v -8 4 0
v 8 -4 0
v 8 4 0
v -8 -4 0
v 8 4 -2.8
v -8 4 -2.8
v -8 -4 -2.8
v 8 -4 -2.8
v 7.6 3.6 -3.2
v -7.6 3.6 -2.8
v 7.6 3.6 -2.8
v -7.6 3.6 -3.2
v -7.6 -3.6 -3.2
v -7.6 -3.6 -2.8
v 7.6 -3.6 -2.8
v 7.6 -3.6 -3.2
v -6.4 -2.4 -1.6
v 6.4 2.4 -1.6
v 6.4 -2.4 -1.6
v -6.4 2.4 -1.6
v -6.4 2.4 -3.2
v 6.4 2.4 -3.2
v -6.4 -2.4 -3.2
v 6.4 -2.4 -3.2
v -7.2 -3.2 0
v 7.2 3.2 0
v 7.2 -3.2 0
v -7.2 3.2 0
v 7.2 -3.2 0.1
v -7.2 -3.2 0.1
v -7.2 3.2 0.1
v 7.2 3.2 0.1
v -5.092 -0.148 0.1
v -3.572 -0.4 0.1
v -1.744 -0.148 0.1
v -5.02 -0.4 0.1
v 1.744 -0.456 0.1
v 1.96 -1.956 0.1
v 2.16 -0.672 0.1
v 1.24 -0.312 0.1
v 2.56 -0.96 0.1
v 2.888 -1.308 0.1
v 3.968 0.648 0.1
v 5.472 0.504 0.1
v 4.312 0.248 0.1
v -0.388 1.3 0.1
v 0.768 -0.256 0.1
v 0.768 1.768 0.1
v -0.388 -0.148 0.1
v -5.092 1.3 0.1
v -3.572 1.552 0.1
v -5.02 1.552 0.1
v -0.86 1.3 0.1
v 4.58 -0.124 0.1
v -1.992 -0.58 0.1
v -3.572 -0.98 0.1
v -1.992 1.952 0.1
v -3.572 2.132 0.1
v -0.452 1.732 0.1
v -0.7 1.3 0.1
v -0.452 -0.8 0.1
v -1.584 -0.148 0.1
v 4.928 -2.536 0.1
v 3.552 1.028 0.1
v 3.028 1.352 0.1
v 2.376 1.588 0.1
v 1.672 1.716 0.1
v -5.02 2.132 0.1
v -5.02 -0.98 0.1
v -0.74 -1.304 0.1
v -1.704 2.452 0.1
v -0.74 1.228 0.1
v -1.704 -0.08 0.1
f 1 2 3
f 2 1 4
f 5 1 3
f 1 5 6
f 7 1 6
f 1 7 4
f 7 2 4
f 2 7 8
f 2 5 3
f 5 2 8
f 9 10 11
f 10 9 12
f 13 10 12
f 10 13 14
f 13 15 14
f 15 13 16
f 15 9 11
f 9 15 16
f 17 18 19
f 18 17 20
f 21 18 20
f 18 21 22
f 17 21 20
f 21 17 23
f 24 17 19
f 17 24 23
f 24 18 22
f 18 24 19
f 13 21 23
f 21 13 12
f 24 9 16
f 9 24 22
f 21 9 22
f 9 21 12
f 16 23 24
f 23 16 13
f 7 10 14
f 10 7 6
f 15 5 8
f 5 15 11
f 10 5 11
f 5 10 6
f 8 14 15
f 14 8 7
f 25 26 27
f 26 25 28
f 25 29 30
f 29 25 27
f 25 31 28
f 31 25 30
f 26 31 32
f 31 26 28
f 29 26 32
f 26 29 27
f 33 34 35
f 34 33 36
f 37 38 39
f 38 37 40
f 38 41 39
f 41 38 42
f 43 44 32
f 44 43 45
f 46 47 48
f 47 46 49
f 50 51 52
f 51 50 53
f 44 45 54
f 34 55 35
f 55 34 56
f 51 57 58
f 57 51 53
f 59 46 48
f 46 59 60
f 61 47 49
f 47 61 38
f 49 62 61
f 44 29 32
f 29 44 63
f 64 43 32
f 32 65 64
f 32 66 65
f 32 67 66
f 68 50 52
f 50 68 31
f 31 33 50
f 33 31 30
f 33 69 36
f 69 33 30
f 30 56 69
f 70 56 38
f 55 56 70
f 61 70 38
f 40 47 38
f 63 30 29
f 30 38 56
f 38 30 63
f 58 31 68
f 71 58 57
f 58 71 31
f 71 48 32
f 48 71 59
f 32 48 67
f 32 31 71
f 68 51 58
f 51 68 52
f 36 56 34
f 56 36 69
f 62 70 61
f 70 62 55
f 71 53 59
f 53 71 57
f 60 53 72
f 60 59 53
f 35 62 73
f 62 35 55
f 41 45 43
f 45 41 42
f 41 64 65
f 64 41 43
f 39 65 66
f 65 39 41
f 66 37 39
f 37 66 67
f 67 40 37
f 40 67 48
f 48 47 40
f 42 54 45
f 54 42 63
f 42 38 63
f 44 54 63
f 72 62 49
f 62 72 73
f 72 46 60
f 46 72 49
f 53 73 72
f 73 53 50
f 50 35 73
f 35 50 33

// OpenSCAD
// file: ../p/box5-12.scad
use <../lib.scad>
function ldraw_lib__box5_12() = [
// 0 Box with 5 Faces without Any Edges
// 0 Name: box5-12.dat
// 0 Author: Chris Dee [cwdee]
// 0 !LDRAW_ORG Primitive UPDATE 2009-02
// 0 !LICENSE Licensed under CC BY 4.0 : see CAreadme.txt
// 
// 0 BFC CERTIFY CCW
  [0,"BFC","CERTIFY"],
  [0,"BFC","CCW"],
// 
// 0 !HISTORY 2009-09-03 [PTadmin] Official Update 2009-02
// 
// 
// 4 16 1 1 1 1 1 -1 -1 1 -1 -1 1 1
  [4,16,1,1,1,1,1,-1,-1,1,-1,-1,1,1],
// 4 16 -1 0 1 1 0 1 1 1 1 -1 1 1
  [4,16,-1,0,1,1,0,1,1,1,1,-1,1,1],
// 4 16 -1 0 -1 -1 0 1 -1 1 1 -1 1 -1
  [4,16,-1,0,-1,-1,0,1,-1,1,1,-1,1,-1],
// 4 16 1 0 -1 -1 0 -1 -1 1 -1 1 1 -1
  [4,16,1,0,-1,-1,0,-1,-1,1,-1,1,1,-1],
// 4 16 1 0 1 1 0 -1 1 1 -1 1 1 1
  [4,16,1,0,1,1,0,-1,1,1,-1,1,1,1],
// 0
];
module ldraw_lib__box5_12(step=0, col=false, unit=2/5, alt=false, line=0.2, solid=!$preview)
    makepoly(ldraw_lib__box5_12(), step=step, col=col, unit=unit, alt=alt, line=line, solid=solid);
ldraw_lib__box5_12(line=0.2);
// file: ../p/box5.scad
use <../lib.scad>
function ldraw_lib__box5() = [
// 0 Box with 5 Faces and All Edges
// 0 Name: box5.dat
// 0 Author: James Jessiman
// 0 !LDRAW_ORG Primitive UPDATE 2012-01
// 0 !LICENSE Licensed under CC BY 4.0 : see CAreadme.txt
// 
// 0 BFC CERTIFY CCW
  [0,"BFC","CERTIFY"],
  [0,"BFC","CCW"],
// 
// 0 !HISTORY 2002-04-03 [sbliss] Modified for BFC compliance
// 0 !HISTORY 2002-04-25 [PTadmin] Official Update 2002-02
// 0 !HISTORY 2007-06-24 [PTadmin] Header formatted for Contributor Agreement
// 0 !HISTORY 2008-07-01 [PTadmin] Official Update 2008-01
// 0 !HISTORY 2012-02-16 [Philo] Changed to CCW
// 0 !HISTORY 2012-03-30 [PTadmin] Official Update 2012-01
// 
// 
// 2 24 1 1 1 -1 1 1
  [2,24,1,1,1,-1,1,1],
// 2 24 -1 1 1 -1 1 -1
  [2,24,-1,1,1,-1,1,-1],
// 2 24 -1 1 -1 1 1 -1
  [2,24,-1,1,-1,1,1,-1],
// 2 24 1 1 -1 1 1 1
  [2,24,1,1,-1,1,1,1],
// 2 24 1 0 1 -1 0 1
  [2,24,1,0,1,-1,0,1],
// 2 24 -1 0 1 -1 0 -1
  [2,24,-1,0,1,-1,0,-1],
// 2 24 -1 0 -1 1 0 -1
  [2,24,-1,0,-1,1,0,-1],
// 2 24 1 0 -1 1 0 1
  [2,24,1,0,-1,1,0,1],
// 2 24 1 0 1 1 1 1
  [2,24,1,0,1,1,1,1],
// 2 24 -1 0 1 -1 1 1
  [2,24,-1,0,1,-1,1,1],
// 2 24 1 0 -1 1 1 -1
  [2,24,1,0,-1,1,1,-1],
// 2 24 -1 0 -1 -1 1 -1
  [2,24,-1,0,-1,-1,1,-1],
// 4 16 -1 1 1 1 1 1 1 1 -1 -1 1 -1
  [4,16,-1,1,1,1,1,1,1,1,-1,-1,1,-1],
// 4 16 -1 1 1 -1 0 1 1 0 1 1 1 1
  [4,16,-1,1,1,-1,0,1,1,0,1,1,1,1],
// 4 16 -1 1 -1 -1 0 -1 -1 0 1 -1 1 1
  [4,16,-1,1,-1,-1,0,-1,-1,0,1,-1,1,1],
// 4 16 1 1 -1 1 0 -1 -1 0 -1 -1 1 -1
  [4,16,1,1,-1,1,0,-1,-1,0,-1,-1,1,-1],
// 4 16 1 1 1 1 0 1 1 0 -1 1 1 -1
  [4,16,1,1,1,1,0,1,1,0,-1,1,1,-1],
];
module ldraw_lib__box5(step=0, col=false, unit=2/5, alt=false, line=0.2, solid=!$preview)
    makepoly(ldraw_lib__box5(), step=step, col=col, unit=unit, alt=alt, line=line, solid=solid);
ldraw_lib__box5(line=0.2);
// file: ../p/box4.scad
use <../lib.scad>
function ldraw_lib__box4() = [
// 0 Box with 4 Faces (2 Parallel Pairs) and All Edges
// 0 Name: box4.dat
// 0 Author: James Jessiman
// 0 !LDRAW_ORG Primitive UPDATE 2012-01
// 0 !LICENSE Licensed under CC BY 4.0 : see CAreadme.txt
// 
// 0 BFC CERTIFY CCW
  [0,"BFC","CERTIFY"],
  [0,"BFC","CCW"],
// 
// 0 !HISTORY 2002-04-03 [sbliss] Modified for BFC compliance
// 0 !HISTORY 2002-04-25 [PTadmin] Official Update 2002-02
// 0 !HISTORY 2007-06-24 [PTadmin] Header formatted for Contributor Agreement
// 0 !HISTORY 2008-07-01 [PTadmin] Official Update 2008-01
// 0 !HISTORY 2012-02-16 [Philo] Changed to CCW
// 0 !HISTORY 2012-03-30 [PTadmin] Official Update 2012-01
// 
// 
// 2 24 1 1 1 -1 1 1
  [2,24,1,1,1,-1,1,1],
// 2 24 -1 1 1 -1 1 -1
  [2,24,-1,1,1,-1,1,-1],
// 2 24 -1 1 -1 1 1 -1
  [2,24,-1,1,-1,1,1,-1],
// 2 24 1 1 -1 1 1 1
  [2,24,1,1,-1,1,1,1],
// 2 24 1 0 1 -1 0 1
  [2,24,1,0,1,-1,0,1],
// 2 24 -1 0 1 -1 0 -1
  [2,24,-1,0,1,-1,0,-1],
// 2 24 -1 0 -1 1 0 -1
  [2,24,-1,0,-1,1,0,-1],
// 2 24 1 0 -1 1 0 1
  [2,24,1,0,-1,1,0,1],
// 2 24 1 0 1 1 1 1
  [2,24,1,0,1,1,1,1],
// 2 24 -1 0 1 -1 1 1
  [2,24,-1,0,1,-1,1,1],
// 2 24 1 0 -1 1 1 -1
  [2,24,1,0,-1,1,1,-1],
// 2 24 -1 0 -1 -1 1 -1
  [2,24,-1,0,-1,-1,1,-1],
// 4 16 -1 1 1 -1 0 1 1 0 1 1 1 1
  [4,16,-1,1,1,-1,0,1,1,0,1,1,1,1],
// 4 16 -1 1 -1 -1 0 -1 -1 0 1 -1 1 1
  [4,16,-1,1,-1,-1,0,-1,-1,0,1,-1,1,1],
// 4 16 1 1 -1 1 0 -1 -1 0 -1 -1 1 -1
  [4,16,1,1,-1,1,0,-1,-1,0,-1,-1,1,-1],
// 4 16 1 1 1 1 0 1 1 0 -1 1 1 -1
  [4,16,1,1,1,1,0,1,1,0,-1,1,1,-1],
];
module ldraw_lib__box4(step=0, col=false, unit=2/5, alt=false, line=0.2, solid=!$preview)
    makepoly(ldraw_lib__box4(), step=step, col=col, unit=unit, alt=alt, line=line, solid=solid);
ldraw_lib__box4(line=0.2);
// file: 821577g.scad
use <../lib.scad>
use <../p/box5-12.scad>
function ldraw_lib__821577g() = [
// 0 Sticker  0.8 x  1.8 with Car and Red Left Curved Arrow
// 0 Name: 821577g.dat
// 0 Author: Evert-Jan Boer [ejboer]
// 0 !LDRAW_ORG Part UPDATE 2026-07
// 0 !LICENSE Licensed under CC BY 4.0 : see CAreadme.txt
// 
// 0 BFC CERTIFY CCW
  [0,"BFC","CERTIFY"],
  [0,"BFC","CCW"],
// 
// 0 !CATEGORY Sticker
// 0 !KEYWORDS Multi Control, Set 8082
// 
// 0 !HISTORY 2026-07-30 [OrionP] Official Update 2026-07
// 
// 1 16 0 -.25 0 18 0 0 0 0.25 0 0 0 8 box5-12.dat
  [1,16,0,-.25,0,18,0,0,0,0.25,0,0,0,8, ldraw_lib__box5_12()],
// 4 16 -12.73 -.25 .37 -4.36 -.25 .37 -8.93 -.25 1 -12.55 -.25 1
  [4,16,-12.73,-.25,.37,-4.36,-.25,.37,-8.93,-.25,1,-12.55,-.25,1],
// 4 16 4.9 -.25 4.89 3.1 -.25 .78 4.36 -.25 1.14 5.4 -.25 1.68
  [4,16,4.9,-.25,4.89,3.1,-.25,.78,4.36,-.25,1.14,5.4,-.25,1.68],
// 4 16 4.9 -.25 4.89 5.4 -.25 1.68 6.4 -.25 2.4 7.22 -.25 3.27
  [4,16,4.9,-.25,4.89,5.4,-.25,1.68,6.4,-.25,2.4,7.22,-.25,3.27],
// 4 16 13.68 -.25 -1.26 10.78 -.25 -.62 9.92 -.25 -1.62 18 -.25 -8
  [4,16,13.68,-.25,-1.26,10.78,-.25,-.62,9.92,-.25,-1.62,18,-.25,-8],
// 4 16 -.97 -.25 -3.25 1.92 -.25 -4.42 1.92 -.25 .64 -.97 -.25 .37
  [4,16,-.97,-.25,-3.25,1.92,-.25,-4.42,1.92,-.25,.64,-.97,-.25,.37],
// 4 16 -12.73 -.25 -3.25 -12.55 -.25 -3.88 -8.93 -.25 -3.88 -2.15 -.25 -3.25
  [4,16,-12.73,-.25,-3.25,-12.55,-.25,-3.88,-8.93,-.25,-3.88,-2.15,-.25,-3.25],
// 3 16 11.45 -.25 .31 10.78 -.25 -.62 13.68 -.25 -1.26
  [3,16,11.45,-.25,.31,10.78,-.25,-.62,13.68,-.25,-1.26],
// 4 16 -8.93 -.25 1 -4.36 -.25 .37 -4.98 -.25 1.45 -8.93 -.25 2.45
  [4,16,-8.93,-.25,1,-4.36,-.25,.37,-4.98,-.25,1.45,-8.93,-.25,2.45],
// 4 16 -4.98 -.25 -4.88 -2.15 -.25 -3.25 -8.93 -.25 -3.88 -8.93 -.25 -5.33
  [4,16,-4.98,-.25,-4.88,-2.15,-.25,-3.25,-8.93,-.25,-3.88,-8.93,-.25,-5.33],
// 4 16 -.97 -.25 -3.25 -1.75 -.25 -3.25 -1.13 -.25 -4.33 1.92 -.25 -4.42
  [4,16,-.97,-.25,-3.25,-1.75,-.25,-3.25,-1.13,-.25,-4.33,1.92,-.25,-4.42],
// 4 16 -1.13 -.25 2 -.97 -.25 .37 1.92 -.25 .64 4.9 -.25 4.89
  [4,16,-1.13,-.25,2,-.97,-.25,.37,1.92,-.25,.64,4.9,-.25,4.89],
// 3 16 -1.13 -.25 2 -3.96 -.25 .37 -.97 -.25 .37
  [3,16,-1.13,-.25,2,-3.96,-.25,.37,-.97,-.25,.37],
// 4 16 12.32 -.25 6.34 13.68 -.25 -1.26 18 -.25 -8 18 -.25 8
  [4,16,12.32,-.25,6.34,13.68,-.25,-1.26,18,-.25,-8,18,-.25,8],
// 3 16 18 -.25 -8 9.92 -.25 -1.62 8.88 -.25 -2.57
  [3,16,18,-.25,-8,9.92,-.25,-1.62,8.88,-.25,-2.57],
// 3 16 8.88 -.25 -2.57 7.57 -.25 -3.38 18 -.25 -8
  [3,16,8.88,-.25,-2.57,7.57,-.25,-3.38,18,-.25,-8],
// 3 16 7.57 -.25 -3.38 5.94 -.25 -3.97 18 -.25 -8
  [3,16,7.57,-.25,-3.38,5.94,-.25,-3.97,18,-.25,-8],
// 3 16 5.94 -.25 -3.97 4.18 -.25 -4.29 18 -.25 -8
  [3,16,5.94,-.25,-3.97,4.18,-.25,-4.29,18,-.25,-8],
// 4 16 -12.73 -.25 -3.25 -18 -.25 -8 -12.55 -.25 -5.33 -12.55 -.25 -3.88
  [4,16,-12.73,-.25,-3.25,-18,-.25,-8,-12.55,-.25,-5.33,-12.55,-.25,-3.88],
// 4 16 -12.73 -.25 .37 -18 -.25 8 -18 -.25 -8 -12.73 -.25 -3.25
  [4,16,-12.73,-.25,.37,-18,-.25,8,-18,-.25,-8,-12.73,-.25,-3.25],
// 4 16 -18 -.25 8 -12.73 -.25 .37 -12.55 -.25 1 -12.55 -.25 2.45
  [4,16,-18,-.25,8,-12.73,-.25,.37,-12.55,-.25,1,-12.55,-.25,2.45],
// 3 16 -12.55 -.25 2.45 -8.93 -.25 2.45 -18 -.25 8
  [3,16,-12.55,-.25,2.45,-8.93,-.25,2.45,-18,-.25,8],
// 3 16 4.9 -.25 4.89 -8.93 -.25 2.45 -1.85 -.25 3.26
  [3,16,4.9,-.25,4.89,-8.93,-.25,2.45,-1.85,-.25,3.26],
// 3 16 -1.85 -.25 3.26 -8.93 -.25 2.45 -4.98 -.25 1.45
  [3,16,-1.85,-.25,3.26,-8.93,-.25,2.45,-4.98,-.25,1.45],
// 3 16 4.9 -.25 4.89 -1.85 -.25 3.26 -1.13 -.25 2
  [3,16,4.9,-.25,4.89,-1.85,-.25,3.26,-1.13,-.25,2],
// 3 16 4.9 -.25 4.89 1.92 -.25 .64 3.1 -.25 .78
  [3,16,4.9,-.25,4.89,1.92,-.25,.64,3.1,-.25,.78],
// 3 16 18 -.25 8 -18 -.25 8 12.32 -.25 6.34
  [3,16,18,-.25,8,-18,-.25,8,12.32,-.25,6.34],
// 4 16 -8.93 -.25 2.45 4.9 -.25 4.89 12.32 -.25 6.34 -18 -.25 8
  [4,16,-8.93,-.25,2.45,4.9,-.25,4.89,12.32,-.25,6.34,-18,-.25,8],
// 3 16 -12.55 -.25 -5.33 -18 -.25 -8 -8.93 -.25 -5.33
  [3,16,-12.55,-.25,-5.33,-18,-.25,-8,-8.93,-.25,-5.33],
// 4 16 -8.93 -.25 -5.33 -18 -.25 -8 -4.26 -.25 -6.13 -4.98 -.25 -4.88
  [4,16,-8.93,-.25,-5.33,-18,-.25,-8,-4.26,-.25,-6.13,-4.98,-.25,-4.88],
// 4 16 1.92 -.25 -4.42 -1.13 -.25 -4.33 -4.26 -.25 -6.13 18 -.25 -8
  [4,16,1.92,-.25,-4.42,-1.13,-.25,-4.33,-4.26,-.25,-6.13,18,-.25,-8],
// 3 16 4.18 -.25 -4.29 1.92 -.25 -4.42 18 -.25 -8
  [3,16,4.18,-.25,-4.29,1.92,-.25,-4.42,18,-.25,-8],
// 3 16 -4.26 -.25 -6.13 -18 -.25 -8 18 -.25 -8
  [3,16,-4.26,-.25,-6.13,-18,-.25,-8,18,-.25,-8],
// 
// 0 BFC NOCLIP
  [0,"BFC","NOCLIP"],
// 
// 4 14 -12.55 -.25 -3.88 -12.55 -.25 -5.33 -8.93 -.25 -5.33 -8.93 -.25 -3.88
  [4,14,-12.55,-.25,-3.88,-12.55,-.25,-5.33,-8.93,-.25,-5.33,-8.93,-.25,-3.88],
// 4 14 -8.93 -.25 1 -8.93 -.25 2.45 -12.55 -.25 2.45 -12.55 -.25 1
  [4,14,-8.93,-.25,1,-8.93,-.25,2.45,-12.55,-.25,2.45,-12.55,-.25,1],
// 4 14 -4.98 -.25 1.45 -3.96 -.25 .37 -1.13 -.25 2 -1.85 -.25 3.26
  [4,14,-4.98,-.25,1.45,-3.96,-.25,.37,-1.13,-.25,2,-1.85,-.25,3.26],
// 4 14 -4.98 -.25 -4.88 -4.26 -.25 -6.13 -1.13 -.25 -4.33 -2.15 -.25 -3.25
  [4,14,-4.98,-.25,-4.88,-4.26,-.25,-6.13,-1.13,-.25,-4.33,-2.15,-.25,-3.25],
// 3 14 -1.85 -.25 -3.07 -2.15 -.25 -3.25 -1.75 -.25 -3.25
  [3,14,-1.85,-.25,-3.07,-2.15,-.25,-3.25,-1.75,-.25,-3.25],
// 3 14 -2.15 -.25 -3.25 -1.13 -.25 -4.33 -1.75 -.25 -3.25
  [3,14,-2.15,-.25,-3.25,-1.13,-.25,-4.33,-1.75,-.25,-3.25],
// 4 14 -4.26 -.25 .2 -3.96 -.25 .37 -4.98 -.25 1.45 -4.36 -.25 .37
  [4,14,-4.26,-.25,.2,-3.96,-.25,.37,-4.98,-.25,1.45,-4.36,-.25,.37],
// 4 4 6.4 -.25 2.4 9.92 -.25 -1.62 10.78 -.25 -.62 7.22 -.25 3.27
  [4,4,6.4,-.25,2.4,9.92,-.25,-1.62,10.78,-.25,-.62,7.22,-.25,3.27],
// 4 4 6.4 -.25 2.4 7.57 -.25 -3.38 8.88 -.25 -2.57 9.92 -.25 -1.62
  [4,4,6.4,-.25,2.4,7.57,-.25,-3.38,8.88,-.25,-2.57,9.92,-.25,-1.62],
// 4 4 7.57 -.25 -3.38 6.4 -.25 2.4 5.4 -.25 1.68 5.94 -.25 -3.97
  [4,4,7.57,-.25,-3.38,6.4,-.25,2.4,5.4,-.25,1.68,5.94,-.25,-3.97],
// 4 4 5.94 -.25 -3.97 5.4 -.25 1.68 4.36 -.25 1.14 4.18 -.25 -4.29
  [4,4,5.94,-.25,-3.97,5.4,-.25,1.68,4.36,-.25,1.14,4.18,-.25,-4.29],
// 4 4 4.18 -.25 -4.29 4.36 -.25 1.14 3.1 -.25 .78 1.92 -.25 -4.42
  [4,4,4.18,-.25,-4.29,4.36,-.25,1.14,3.1,-.25,.78,1.92,-.25,-4.42],
// 3 4 3.1 -.25 .78 1.92 -.25 .64 1.92 -.25 -4.42
  [3,4,3.1,-.25,.78,1.92,-.25,.64,1.92,-.25,-4.42],
// 4 4 11.45 -.25 .31 12.32 -.25 6.34 7.22 -.25 3.27 10.78 -.25 -.62
  [4,4,11.45,-.25,.31,12.32,-.25,6.34,7.22,-.25,3.27,10.78,-.25,-.62],
// 3 4 12.32 -.25 6.34 4.9 -.25 4.89 7.22 -.25 3.27
  [3,4,12.32,-.25,6.34,4.9,-.25,4.89,7.22,-.25,3.27],
// 3 4 12.32 -.25 6.34 11.45 -.25 .31 13.68 -.25 -1.26
  [3,4,12.32,-.25,6.34,11.45,-.25,.31,13.68,-.25,-1.26],
// 4 0 -4.26 -.25 .2 -1.85 -.25 -3.07 -.97 -.25 .37 -3.96 -.25 .37
  [4,0,-4.26,-.25,.2,-1.85,-.25,-3.07,-.97,-.25,.37,-3.96,-.25,.37],
// 4 0 -.97 -.25 -3.25 -.97 -.25 .37 -1.85 -.25 -3.07 -1.75 -.25 -3.25
  [4,0,-.97,-.25,-3.25,-.97,-.25,.37,-1.85,-.25,-3.07,-1.75,-.25,-3.25],
// 4 0 -2.15 -.25 -3.25 -1.85 -.25 -3.07 -4.26 -.25 .2 -12.73 -.25 -3.25
  [4,0,-2.15,-.25,-3.25,-1.85,-.25,-3.07,-4.26,-.25,.2,-12.73,-.25,-3.25],
// 4 0 -12.73 -.25 -3.25 -4.26 -.25 .2 -4.36 -.25 .37 -12.73 -.25 .37
  [4,0,-12.73,-.25,-3.25,-4.26,-.25,.2,-4.36,-.25,.37,-12.73,-.25,.37],
];
module ldraw_lib__821577g(step=0, col=false, unit=2/5, alt=false, line=0.2, solid=!$preview)
    makepoly(ldraw_lib__821577g(), step=step, col=col, unit=unit, alt=alt, line=line, solid=solid);
ldraw_lib__821577g(line=0.2);
// file: s/3069bs01.scad
use <../../lib.scad>
use <../../p/box4.scad>
use <../../p/box5.scad>
function ldraw_lib__s__3069bs01() = [
// 0 ~Tile  1 x  2 with Groove without Top Face
// 0 Name: s\3069bs01.dat
// 0 Author: Santeri Piippo [arezey]
// 0 !LDRAW_ORG Subpart UPDATE 2010-02
// 0 !LICENSE Licensed under CC BY 4.0 : see CAreadme.txt
// 
// 0 BFC CERTIFY CCW
  [0,"BFC","CERTIFY"],
  [0,"BFC","CCW"],
// 
// 0 !HISTORY 2010-07-05 [PTadmin] Official Update 2010-02
// 
// 
// 1 16 0 0 0 20 0 0 0 7 0 0 0 10 box4.dat
  [1,16,0,0,0,20,0,0,0,7,0,0,0,10, ldraw_lib__box4()],
// 1 16 0 7 0 19 0 0 0 1 0 0 0 9 box4.dat
  [1,16,0,7,0,19,0,0,0,1,0,0,0,9, ldraw_lib__box4()],
// 0 BFC INVERTNEXT
  [0,"BFC","INVERTNEXT"],
// 1 16 0 8 0 16 0 0 0 -4 0 0 0 6 box5.dat
  [1,16,0,8,0,16,0,0,0,-4,0,0,0,6, ldraw_lib__box5()],
// 4 16 -19 8 9 -16 8 6 -16 8 -6 -19 8 -9
  [4,16,-19,8,9,-16,8,6,-16,8,-6,-19,8,-9],
// 4 16 19 8 -9 16 8 -6 16 8 6 19 8 9
  [4,16,19,8,-9,16,8,-6,16,8,6,19,8,9],
// 4 16 19 8 9 16 8 6 -16 8 6 -19 8 9
  [4,16,19,8,9,16,8,6,-16,8,6,-19,8,9],
// 4 16 -19 8 -9 -16 8 -6 16 8 -6 19 8 -9
  [4,16,-19,8,-9,-16,8,-6,16,8,-6,19,8,-9],
// 4 16 -20 7 10 -19 7 9 -19 7 -9 -20 7 -10
  [4,16,-20,7,10,-19,7,9,-19,7,-9,-20,7,-10],
// 4 16 20 7 -10 19 7 -9 19 7 9 20 7 10
  [4,16,20,7,-10,19,7,-9,19,7,9,20,7,10],
// 4 16 20 7 10 19 7 9 -19 7 9 -20 7 10
  [4,16,20,7,10,19,7,9,-19,7,9,-20,7,10],
// 4 16 -20 7 -10 -19 7 -9 19 7 -9 20 7 -10
  [4,16,-20,7,-10,-19,7,-9,19,7,-9,20,7,-10],
// 0 //
];
module ldraw_lib__s__3069bs01(step=0, col=false, unit=2/5, alt=false, line=0.2, solid=!$preview)
    makepoly(ldraw_lib__s__3069bs01(), step=step, col=col, unit=unit, alt=alt, line=line, solid=solid);
ldraw_lib__s__3069bs01(line=0.2);
// file: 821577h.scad
use <../lib.scad>
use <821577g.scad>
function ldraw_lib__821577h() = [
// 0 Sticker  0.8 x  1.8 with Car and Red Right Curved Arrow
// 0 Name: 821577h.dat
// 0 Author: Evert-Jan Boer [ejboer]
// 0 !LDRAW_ORG Part UPDATE 2026-07
// 0 !LICENSE Licensed under CC BY 4.0 : see CAreadme.txt
// 
// 0 BFC CERTIFY CCW
  [0,"BFC","CERTIFY"],
  [0,"BFC","CCW"],
// 
// 0 !CATEGORY Sticker
// 0 !KEYWORDS Multi Control, Set 8082
// 
// 0 !HISTORY 2026-07-30 [OrionP] Official Update 2026-07
// 
// 1 16 0 0 0 1 0 0 0 1 0 0 0 -1 821577g.dat
  [1,16,0,0,0,1,0,0,0,1,0,0,0,-1, ldraw_lib__821577g()],
];
module ldraw_lib__821577h(step=0, col=false, unit=2/5, alt=false, line=0.2, solid=!$preview)
    makepoly(ldraw_lib__821577h(), step=step, col=col, unit=unit, alt=alt, line=line, solid=solid);
ldraw_lib__821577h(line=0.2);
// file: 3069b.scad
use <../lib.scad>
use <s/3069bs01.scad>
function ldraw_lib__3069b() = [
// 0 Tile  1 x  2 with Groove
// 0 Name: 3069b.dat
// 0 Author: Santeri Piippo [arezey]
// 0 !LDRAW_ORG Part UPDATE 2010-02
// 0 !LICENSE Licensed under CC BY 4.0 : see CAreadme.txt
// 
// 0 BFC CERTIFY CCW
  [0,"BFC","CERTIFY"],
  [0,"BFC","CCW"],
// 
// 0 !KEYWORDS BrickLink 3069
// 
// 0 !HISTORY 2010-07-05 [PTadmin] Official Update 2010-02
// 
// 
// 4 16 20 0 -10 20 0 10 -20 0 10 -20 0 -10
  [4,16,20,0,-10,20,0,10,-20,0,10,-20,0,-10],
// 1 16 0 0 0 1 0 0 0 1 0 0 0 1 s\3069bs01.dat
  [1,16,0,0,0,1,0,0,0,1,0,0,0,1, ldraw_lib__s__3069bs01()],
// 0 //
];
module ldraw_lib__3069b(step=0, col=false, unit=2/5, alt=false, line=0.2, solid=!$preview)
    makepoly(ldraw_lib__3069b(), step=step, col=col, unit=unit, alt=alt, line=line, solid=solid);
ldraw_lib__3069b(line=0.2);
// main file
use <../lib.scad>
use <3069b.scad>
use <821577h.scad>
function ldraw_lib__3069bd1x() = [
// 0 Tile  1 x  2 with Car and Red Right Curved Arrow Sticker
// 0 Name: 3069bd1x.dat
// 0 Author: Evert-Jan Boer [ejboer]
// 0 !LDRAW_ORG Shortcut UPDATE 2026-07
// 0 !LICENSE Licensed under CC BY 4.0 : see CAreadme.txt
// 
// 0 BFC CERTIFY CCW
  [0,"BFC","CERTIFY"],
  [0,"BFC","CCW"],
// 
// 0 !CATEGORY Sticker Shortcut
// 0 !KEYWORDS Bricklink 3069pb0099, Set 8082
// 
// 0 !HISTORY 2026-07-30 [OrionP] Official Update 2026-07
// 
// 1 16 0 0 0 1 0 0 0 1 0 0 0 1 3069b.dat
  [1,16,0,0,0,1,0,0,0,1,0,0,0,1, ldraw_lib__3069b()],
// 1 16 0 0 0 1 0 0 0 1 0 0 0 1 821577h.dat
  [1,16,0,0,0,1,0,0,0,1,0,0,0,1, ldraw_lib__821577h()],
];
module ldraw_lib__3069bd1x(step=0, col=false, unit=2/5, alt=false, line=0.2, solid=!$preview)
    makepoly(ldraw_lib__3069bd1x(), step=step, col=col, unit=unit, alt=alt, line=line, solid=solid);
ldraw_lib__3069bd1x(line=0.2);
